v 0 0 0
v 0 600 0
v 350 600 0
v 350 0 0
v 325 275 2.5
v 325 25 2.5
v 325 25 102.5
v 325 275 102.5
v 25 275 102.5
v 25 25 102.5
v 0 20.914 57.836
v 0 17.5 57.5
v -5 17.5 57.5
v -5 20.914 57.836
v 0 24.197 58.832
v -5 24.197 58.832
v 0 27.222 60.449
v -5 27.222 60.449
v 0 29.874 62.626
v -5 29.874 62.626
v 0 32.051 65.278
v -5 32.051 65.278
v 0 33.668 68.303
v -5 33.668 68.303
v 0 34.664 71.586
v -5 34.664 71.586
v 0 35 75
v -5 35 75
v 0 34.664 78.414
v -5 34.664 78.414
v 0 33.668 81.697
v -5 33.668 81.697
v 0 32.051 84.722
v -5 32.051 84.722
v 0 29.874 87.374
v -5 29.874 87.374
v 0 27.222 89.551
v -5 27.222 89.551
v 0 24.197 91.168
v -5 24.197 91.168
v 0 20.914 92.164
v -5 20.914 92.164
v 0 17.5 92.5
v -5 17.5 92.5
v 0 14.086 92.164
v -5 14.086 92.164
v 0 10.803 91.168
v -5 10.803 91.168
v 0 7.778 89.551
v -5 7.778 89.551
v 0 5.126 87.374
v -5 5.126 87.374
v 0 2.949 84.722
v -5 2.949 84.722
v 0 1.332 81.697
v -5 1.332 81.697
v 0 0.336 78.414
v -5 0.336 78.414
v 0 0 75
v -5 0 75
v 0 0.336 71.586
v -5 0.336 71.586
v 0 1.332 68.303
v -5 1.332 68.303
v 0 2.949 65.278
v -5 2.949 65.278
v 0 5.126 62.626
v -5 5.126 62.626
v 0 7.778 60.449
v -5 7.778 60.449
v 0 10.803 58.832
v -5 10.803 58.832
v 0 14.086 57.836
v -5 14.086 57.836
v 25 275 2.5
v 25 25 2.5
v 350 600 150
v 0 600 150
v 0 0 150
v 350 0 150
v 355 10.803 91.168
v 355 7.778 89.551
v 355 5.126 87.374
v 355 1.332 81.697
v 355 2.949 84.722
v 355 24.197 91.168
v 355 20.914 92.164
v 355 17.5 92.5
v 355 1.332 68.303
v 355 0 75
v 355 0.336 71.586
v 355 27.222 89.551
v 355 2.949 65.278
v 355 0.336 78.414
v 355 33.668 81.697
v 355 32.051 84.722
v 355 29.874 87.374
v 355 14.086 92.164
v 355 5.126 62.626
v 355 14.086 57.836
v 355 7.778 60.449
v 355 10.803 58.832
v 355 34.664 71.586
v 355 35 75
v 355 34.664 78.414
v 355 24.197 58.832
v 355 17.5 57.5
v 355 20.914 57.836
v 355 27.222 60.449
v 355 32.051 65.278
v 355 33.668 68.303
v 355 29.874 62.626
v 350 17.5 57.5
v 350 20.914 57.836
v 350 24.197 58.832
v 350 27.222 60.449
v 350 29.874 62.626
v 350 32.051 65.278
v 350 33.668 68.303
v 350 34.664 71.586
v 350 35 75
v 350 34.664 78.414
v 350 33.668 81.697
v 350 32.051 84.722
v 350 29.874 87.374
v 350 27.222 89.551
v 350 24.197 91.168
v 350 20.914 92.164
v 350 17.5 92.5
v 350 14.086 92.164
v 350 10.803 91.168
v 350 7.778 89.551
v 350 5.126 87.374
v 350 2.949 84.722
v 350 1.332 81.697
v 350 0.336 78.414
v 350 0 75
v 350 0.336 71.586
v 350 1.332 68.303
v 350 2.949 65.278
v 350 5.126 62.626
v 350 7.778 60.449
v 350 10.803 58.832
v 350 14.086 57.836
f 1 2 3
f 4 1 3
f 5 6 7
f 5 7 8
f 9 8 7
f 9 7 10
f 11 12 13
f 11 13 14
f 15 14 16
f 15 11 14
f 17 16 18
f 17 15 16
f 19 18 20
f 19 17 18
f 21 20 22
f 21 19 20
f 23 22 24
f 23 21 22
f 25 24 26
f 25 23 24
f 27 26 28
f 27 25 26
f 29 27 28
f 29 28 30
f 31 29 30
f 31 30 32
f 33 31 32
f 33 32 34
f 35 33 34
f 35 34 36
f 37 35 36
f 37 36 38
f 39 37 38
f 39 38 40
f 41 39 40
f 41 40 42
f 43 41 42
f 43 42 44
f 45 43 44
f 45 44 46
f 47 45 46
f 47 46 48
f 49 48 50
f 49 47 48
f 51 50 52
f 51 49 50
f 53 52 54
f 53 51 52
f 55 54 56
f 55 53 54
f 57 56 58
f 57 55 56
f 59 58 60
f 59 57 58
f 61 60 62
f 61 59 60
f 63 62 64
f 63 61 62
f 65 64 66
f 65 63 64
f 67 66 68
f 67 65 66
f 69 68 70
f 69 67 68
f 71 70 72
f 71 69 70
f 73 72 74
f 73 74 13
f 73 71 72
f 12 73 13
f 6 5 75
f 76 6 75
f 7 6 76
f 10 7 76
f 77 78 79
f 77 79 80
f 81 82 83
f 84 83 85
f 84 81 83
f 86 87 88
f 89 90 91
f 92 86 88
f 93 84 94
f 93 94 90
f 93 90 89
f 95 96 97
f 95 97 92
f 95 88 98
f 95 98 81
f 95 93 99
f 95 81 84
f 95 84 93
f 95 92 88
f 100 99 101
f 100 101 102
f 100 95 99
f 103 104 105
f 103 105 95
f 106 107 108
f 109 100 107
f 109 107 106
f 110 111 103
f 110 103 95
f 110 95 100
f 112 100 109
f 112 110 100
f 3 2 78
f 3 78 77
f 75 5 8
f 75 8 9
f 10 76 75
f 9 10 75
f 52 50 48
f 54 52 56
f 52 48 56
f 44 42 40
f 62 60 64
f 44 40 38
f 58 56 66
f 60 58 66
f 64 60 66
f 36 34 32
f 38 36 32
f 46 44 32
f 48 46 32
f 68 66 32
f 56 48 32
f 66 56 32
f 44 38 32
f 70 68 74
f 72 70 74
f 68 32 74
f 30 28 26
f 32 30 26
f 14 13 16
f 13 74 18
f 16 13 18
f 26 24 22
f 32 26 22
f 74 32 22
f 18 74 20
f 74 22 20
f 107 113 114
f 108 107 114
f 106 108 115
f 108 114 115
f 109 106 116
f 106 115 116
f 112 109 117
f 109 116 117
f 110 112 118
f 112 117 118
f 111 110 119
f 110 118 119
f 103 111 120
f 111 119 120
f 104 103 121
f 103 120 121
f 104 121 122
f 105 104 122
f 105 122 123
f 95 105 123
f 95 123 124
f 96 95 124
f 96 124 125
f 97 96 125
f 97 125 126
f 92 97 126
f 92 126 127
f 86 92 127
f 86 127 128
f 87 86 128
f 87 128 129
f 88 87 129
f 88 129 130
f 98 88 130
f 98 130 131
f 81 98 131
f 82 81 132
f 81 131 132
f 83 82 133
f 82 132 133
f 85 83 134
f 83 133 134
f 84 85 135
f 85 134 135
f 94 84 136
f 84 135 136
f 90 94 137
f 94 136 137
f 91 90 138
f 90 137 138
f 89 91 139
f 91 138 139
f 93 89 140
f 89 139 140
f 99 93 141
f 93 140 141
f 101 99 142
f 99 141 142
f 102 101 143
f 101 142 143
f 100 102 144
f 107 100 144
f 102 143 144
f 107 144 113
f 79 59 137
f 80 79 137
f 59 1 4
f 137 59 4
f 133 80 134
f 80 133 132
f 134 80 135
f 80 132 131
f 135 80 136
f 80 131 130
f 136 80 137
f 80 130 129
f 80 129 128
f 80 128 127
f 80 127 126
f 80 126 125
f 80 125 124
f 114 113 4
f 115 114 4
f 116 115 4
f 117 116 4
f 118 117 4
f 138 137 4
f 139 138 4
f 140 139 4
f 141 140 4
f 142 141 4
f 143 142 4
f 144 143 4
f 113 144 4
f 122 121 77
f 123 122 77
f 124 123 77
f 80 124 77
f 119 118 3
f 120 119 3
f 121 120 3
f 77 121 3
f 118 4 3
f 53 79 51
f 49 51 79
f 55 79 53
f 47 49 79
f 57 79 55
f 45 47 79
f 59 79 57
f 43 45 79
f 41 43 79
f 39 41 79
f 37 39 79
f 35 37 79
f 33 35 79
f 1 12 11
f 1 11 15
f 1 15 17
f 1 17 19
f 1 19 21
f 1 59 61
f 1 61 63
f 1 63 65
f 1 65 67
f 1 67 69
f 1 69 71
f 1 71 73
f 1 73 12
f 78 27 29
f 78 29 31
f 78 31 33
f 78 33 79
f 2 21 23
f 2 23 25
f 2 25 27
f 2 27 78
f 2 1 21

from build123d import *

# Parameters (mm, degrees)
SZKIC1_W                    = 350
SZKIC1_H                    = 600
DODANIE_WYCI_GNI_CIE1_DEPTH = 150
WYTNIJ_WYCI_GNI_CIE1_START  = -2.5
SZKIC2_W                    = 300
SZKIC2_H                    = 250
WYTNIJ_WYCI_GNI_CIE1_DEPTH  = 100
SZKIC3_R                    = 17.5
DODANIE_WYCI_GNI_CIE2_DEPTH = 5


with BuildPart() as part:
    # Szkic1 → Dodanie-wyciągnięcie1 (new body)
    with BuildSketch(Plane.XY):
        with Locations((175, 300)):
            Rectangle(SZKIC1_W, SZKIC1_H)
    extrude(amount=DODANIE_WYCI_GNI_CIE1_DEPTH)

    # Szkic2 → Wytnij-wyciągnięcie1 (cut)
    with BuildSketch(Plane(origin=(0, 0, 0), x_dir=(-1, 0, 0), z_dir=(0, 0, -1)).offset(WYTNIJ_WYCI_GNI_CIE1_START)):
        with Locations((-175, 150)):
            Rectangle(SZKIC2_W, SZKIC2_H)
    extrude(amount=-WYTNIJ_WYCI_GNI_CIE1_DEPTH, mode=Mode.SUBTRACT)

    # Szkic3 → Dodanie-wyciągnięcie2 (add)
    with BuildSketch(Plane(origin=(350, 0, 0), x_dir=(0, 0, -1), z_dir=(1, 0, 0))):
        with Locations((-75, 17.5)):
            Circle(SZKIC3_R)
    dodanie_wyci_gni_cie2 = extrude(amount=DODANIE_WYCI_GNI_CIE2_DEPTH)

    # Lustro1: Dodanie-wyciągnięcie2 across plane
    add(dodanie_wyci_gni_cie2.mirror(Plane.ZY.offset(-175)))


solid = part.part
